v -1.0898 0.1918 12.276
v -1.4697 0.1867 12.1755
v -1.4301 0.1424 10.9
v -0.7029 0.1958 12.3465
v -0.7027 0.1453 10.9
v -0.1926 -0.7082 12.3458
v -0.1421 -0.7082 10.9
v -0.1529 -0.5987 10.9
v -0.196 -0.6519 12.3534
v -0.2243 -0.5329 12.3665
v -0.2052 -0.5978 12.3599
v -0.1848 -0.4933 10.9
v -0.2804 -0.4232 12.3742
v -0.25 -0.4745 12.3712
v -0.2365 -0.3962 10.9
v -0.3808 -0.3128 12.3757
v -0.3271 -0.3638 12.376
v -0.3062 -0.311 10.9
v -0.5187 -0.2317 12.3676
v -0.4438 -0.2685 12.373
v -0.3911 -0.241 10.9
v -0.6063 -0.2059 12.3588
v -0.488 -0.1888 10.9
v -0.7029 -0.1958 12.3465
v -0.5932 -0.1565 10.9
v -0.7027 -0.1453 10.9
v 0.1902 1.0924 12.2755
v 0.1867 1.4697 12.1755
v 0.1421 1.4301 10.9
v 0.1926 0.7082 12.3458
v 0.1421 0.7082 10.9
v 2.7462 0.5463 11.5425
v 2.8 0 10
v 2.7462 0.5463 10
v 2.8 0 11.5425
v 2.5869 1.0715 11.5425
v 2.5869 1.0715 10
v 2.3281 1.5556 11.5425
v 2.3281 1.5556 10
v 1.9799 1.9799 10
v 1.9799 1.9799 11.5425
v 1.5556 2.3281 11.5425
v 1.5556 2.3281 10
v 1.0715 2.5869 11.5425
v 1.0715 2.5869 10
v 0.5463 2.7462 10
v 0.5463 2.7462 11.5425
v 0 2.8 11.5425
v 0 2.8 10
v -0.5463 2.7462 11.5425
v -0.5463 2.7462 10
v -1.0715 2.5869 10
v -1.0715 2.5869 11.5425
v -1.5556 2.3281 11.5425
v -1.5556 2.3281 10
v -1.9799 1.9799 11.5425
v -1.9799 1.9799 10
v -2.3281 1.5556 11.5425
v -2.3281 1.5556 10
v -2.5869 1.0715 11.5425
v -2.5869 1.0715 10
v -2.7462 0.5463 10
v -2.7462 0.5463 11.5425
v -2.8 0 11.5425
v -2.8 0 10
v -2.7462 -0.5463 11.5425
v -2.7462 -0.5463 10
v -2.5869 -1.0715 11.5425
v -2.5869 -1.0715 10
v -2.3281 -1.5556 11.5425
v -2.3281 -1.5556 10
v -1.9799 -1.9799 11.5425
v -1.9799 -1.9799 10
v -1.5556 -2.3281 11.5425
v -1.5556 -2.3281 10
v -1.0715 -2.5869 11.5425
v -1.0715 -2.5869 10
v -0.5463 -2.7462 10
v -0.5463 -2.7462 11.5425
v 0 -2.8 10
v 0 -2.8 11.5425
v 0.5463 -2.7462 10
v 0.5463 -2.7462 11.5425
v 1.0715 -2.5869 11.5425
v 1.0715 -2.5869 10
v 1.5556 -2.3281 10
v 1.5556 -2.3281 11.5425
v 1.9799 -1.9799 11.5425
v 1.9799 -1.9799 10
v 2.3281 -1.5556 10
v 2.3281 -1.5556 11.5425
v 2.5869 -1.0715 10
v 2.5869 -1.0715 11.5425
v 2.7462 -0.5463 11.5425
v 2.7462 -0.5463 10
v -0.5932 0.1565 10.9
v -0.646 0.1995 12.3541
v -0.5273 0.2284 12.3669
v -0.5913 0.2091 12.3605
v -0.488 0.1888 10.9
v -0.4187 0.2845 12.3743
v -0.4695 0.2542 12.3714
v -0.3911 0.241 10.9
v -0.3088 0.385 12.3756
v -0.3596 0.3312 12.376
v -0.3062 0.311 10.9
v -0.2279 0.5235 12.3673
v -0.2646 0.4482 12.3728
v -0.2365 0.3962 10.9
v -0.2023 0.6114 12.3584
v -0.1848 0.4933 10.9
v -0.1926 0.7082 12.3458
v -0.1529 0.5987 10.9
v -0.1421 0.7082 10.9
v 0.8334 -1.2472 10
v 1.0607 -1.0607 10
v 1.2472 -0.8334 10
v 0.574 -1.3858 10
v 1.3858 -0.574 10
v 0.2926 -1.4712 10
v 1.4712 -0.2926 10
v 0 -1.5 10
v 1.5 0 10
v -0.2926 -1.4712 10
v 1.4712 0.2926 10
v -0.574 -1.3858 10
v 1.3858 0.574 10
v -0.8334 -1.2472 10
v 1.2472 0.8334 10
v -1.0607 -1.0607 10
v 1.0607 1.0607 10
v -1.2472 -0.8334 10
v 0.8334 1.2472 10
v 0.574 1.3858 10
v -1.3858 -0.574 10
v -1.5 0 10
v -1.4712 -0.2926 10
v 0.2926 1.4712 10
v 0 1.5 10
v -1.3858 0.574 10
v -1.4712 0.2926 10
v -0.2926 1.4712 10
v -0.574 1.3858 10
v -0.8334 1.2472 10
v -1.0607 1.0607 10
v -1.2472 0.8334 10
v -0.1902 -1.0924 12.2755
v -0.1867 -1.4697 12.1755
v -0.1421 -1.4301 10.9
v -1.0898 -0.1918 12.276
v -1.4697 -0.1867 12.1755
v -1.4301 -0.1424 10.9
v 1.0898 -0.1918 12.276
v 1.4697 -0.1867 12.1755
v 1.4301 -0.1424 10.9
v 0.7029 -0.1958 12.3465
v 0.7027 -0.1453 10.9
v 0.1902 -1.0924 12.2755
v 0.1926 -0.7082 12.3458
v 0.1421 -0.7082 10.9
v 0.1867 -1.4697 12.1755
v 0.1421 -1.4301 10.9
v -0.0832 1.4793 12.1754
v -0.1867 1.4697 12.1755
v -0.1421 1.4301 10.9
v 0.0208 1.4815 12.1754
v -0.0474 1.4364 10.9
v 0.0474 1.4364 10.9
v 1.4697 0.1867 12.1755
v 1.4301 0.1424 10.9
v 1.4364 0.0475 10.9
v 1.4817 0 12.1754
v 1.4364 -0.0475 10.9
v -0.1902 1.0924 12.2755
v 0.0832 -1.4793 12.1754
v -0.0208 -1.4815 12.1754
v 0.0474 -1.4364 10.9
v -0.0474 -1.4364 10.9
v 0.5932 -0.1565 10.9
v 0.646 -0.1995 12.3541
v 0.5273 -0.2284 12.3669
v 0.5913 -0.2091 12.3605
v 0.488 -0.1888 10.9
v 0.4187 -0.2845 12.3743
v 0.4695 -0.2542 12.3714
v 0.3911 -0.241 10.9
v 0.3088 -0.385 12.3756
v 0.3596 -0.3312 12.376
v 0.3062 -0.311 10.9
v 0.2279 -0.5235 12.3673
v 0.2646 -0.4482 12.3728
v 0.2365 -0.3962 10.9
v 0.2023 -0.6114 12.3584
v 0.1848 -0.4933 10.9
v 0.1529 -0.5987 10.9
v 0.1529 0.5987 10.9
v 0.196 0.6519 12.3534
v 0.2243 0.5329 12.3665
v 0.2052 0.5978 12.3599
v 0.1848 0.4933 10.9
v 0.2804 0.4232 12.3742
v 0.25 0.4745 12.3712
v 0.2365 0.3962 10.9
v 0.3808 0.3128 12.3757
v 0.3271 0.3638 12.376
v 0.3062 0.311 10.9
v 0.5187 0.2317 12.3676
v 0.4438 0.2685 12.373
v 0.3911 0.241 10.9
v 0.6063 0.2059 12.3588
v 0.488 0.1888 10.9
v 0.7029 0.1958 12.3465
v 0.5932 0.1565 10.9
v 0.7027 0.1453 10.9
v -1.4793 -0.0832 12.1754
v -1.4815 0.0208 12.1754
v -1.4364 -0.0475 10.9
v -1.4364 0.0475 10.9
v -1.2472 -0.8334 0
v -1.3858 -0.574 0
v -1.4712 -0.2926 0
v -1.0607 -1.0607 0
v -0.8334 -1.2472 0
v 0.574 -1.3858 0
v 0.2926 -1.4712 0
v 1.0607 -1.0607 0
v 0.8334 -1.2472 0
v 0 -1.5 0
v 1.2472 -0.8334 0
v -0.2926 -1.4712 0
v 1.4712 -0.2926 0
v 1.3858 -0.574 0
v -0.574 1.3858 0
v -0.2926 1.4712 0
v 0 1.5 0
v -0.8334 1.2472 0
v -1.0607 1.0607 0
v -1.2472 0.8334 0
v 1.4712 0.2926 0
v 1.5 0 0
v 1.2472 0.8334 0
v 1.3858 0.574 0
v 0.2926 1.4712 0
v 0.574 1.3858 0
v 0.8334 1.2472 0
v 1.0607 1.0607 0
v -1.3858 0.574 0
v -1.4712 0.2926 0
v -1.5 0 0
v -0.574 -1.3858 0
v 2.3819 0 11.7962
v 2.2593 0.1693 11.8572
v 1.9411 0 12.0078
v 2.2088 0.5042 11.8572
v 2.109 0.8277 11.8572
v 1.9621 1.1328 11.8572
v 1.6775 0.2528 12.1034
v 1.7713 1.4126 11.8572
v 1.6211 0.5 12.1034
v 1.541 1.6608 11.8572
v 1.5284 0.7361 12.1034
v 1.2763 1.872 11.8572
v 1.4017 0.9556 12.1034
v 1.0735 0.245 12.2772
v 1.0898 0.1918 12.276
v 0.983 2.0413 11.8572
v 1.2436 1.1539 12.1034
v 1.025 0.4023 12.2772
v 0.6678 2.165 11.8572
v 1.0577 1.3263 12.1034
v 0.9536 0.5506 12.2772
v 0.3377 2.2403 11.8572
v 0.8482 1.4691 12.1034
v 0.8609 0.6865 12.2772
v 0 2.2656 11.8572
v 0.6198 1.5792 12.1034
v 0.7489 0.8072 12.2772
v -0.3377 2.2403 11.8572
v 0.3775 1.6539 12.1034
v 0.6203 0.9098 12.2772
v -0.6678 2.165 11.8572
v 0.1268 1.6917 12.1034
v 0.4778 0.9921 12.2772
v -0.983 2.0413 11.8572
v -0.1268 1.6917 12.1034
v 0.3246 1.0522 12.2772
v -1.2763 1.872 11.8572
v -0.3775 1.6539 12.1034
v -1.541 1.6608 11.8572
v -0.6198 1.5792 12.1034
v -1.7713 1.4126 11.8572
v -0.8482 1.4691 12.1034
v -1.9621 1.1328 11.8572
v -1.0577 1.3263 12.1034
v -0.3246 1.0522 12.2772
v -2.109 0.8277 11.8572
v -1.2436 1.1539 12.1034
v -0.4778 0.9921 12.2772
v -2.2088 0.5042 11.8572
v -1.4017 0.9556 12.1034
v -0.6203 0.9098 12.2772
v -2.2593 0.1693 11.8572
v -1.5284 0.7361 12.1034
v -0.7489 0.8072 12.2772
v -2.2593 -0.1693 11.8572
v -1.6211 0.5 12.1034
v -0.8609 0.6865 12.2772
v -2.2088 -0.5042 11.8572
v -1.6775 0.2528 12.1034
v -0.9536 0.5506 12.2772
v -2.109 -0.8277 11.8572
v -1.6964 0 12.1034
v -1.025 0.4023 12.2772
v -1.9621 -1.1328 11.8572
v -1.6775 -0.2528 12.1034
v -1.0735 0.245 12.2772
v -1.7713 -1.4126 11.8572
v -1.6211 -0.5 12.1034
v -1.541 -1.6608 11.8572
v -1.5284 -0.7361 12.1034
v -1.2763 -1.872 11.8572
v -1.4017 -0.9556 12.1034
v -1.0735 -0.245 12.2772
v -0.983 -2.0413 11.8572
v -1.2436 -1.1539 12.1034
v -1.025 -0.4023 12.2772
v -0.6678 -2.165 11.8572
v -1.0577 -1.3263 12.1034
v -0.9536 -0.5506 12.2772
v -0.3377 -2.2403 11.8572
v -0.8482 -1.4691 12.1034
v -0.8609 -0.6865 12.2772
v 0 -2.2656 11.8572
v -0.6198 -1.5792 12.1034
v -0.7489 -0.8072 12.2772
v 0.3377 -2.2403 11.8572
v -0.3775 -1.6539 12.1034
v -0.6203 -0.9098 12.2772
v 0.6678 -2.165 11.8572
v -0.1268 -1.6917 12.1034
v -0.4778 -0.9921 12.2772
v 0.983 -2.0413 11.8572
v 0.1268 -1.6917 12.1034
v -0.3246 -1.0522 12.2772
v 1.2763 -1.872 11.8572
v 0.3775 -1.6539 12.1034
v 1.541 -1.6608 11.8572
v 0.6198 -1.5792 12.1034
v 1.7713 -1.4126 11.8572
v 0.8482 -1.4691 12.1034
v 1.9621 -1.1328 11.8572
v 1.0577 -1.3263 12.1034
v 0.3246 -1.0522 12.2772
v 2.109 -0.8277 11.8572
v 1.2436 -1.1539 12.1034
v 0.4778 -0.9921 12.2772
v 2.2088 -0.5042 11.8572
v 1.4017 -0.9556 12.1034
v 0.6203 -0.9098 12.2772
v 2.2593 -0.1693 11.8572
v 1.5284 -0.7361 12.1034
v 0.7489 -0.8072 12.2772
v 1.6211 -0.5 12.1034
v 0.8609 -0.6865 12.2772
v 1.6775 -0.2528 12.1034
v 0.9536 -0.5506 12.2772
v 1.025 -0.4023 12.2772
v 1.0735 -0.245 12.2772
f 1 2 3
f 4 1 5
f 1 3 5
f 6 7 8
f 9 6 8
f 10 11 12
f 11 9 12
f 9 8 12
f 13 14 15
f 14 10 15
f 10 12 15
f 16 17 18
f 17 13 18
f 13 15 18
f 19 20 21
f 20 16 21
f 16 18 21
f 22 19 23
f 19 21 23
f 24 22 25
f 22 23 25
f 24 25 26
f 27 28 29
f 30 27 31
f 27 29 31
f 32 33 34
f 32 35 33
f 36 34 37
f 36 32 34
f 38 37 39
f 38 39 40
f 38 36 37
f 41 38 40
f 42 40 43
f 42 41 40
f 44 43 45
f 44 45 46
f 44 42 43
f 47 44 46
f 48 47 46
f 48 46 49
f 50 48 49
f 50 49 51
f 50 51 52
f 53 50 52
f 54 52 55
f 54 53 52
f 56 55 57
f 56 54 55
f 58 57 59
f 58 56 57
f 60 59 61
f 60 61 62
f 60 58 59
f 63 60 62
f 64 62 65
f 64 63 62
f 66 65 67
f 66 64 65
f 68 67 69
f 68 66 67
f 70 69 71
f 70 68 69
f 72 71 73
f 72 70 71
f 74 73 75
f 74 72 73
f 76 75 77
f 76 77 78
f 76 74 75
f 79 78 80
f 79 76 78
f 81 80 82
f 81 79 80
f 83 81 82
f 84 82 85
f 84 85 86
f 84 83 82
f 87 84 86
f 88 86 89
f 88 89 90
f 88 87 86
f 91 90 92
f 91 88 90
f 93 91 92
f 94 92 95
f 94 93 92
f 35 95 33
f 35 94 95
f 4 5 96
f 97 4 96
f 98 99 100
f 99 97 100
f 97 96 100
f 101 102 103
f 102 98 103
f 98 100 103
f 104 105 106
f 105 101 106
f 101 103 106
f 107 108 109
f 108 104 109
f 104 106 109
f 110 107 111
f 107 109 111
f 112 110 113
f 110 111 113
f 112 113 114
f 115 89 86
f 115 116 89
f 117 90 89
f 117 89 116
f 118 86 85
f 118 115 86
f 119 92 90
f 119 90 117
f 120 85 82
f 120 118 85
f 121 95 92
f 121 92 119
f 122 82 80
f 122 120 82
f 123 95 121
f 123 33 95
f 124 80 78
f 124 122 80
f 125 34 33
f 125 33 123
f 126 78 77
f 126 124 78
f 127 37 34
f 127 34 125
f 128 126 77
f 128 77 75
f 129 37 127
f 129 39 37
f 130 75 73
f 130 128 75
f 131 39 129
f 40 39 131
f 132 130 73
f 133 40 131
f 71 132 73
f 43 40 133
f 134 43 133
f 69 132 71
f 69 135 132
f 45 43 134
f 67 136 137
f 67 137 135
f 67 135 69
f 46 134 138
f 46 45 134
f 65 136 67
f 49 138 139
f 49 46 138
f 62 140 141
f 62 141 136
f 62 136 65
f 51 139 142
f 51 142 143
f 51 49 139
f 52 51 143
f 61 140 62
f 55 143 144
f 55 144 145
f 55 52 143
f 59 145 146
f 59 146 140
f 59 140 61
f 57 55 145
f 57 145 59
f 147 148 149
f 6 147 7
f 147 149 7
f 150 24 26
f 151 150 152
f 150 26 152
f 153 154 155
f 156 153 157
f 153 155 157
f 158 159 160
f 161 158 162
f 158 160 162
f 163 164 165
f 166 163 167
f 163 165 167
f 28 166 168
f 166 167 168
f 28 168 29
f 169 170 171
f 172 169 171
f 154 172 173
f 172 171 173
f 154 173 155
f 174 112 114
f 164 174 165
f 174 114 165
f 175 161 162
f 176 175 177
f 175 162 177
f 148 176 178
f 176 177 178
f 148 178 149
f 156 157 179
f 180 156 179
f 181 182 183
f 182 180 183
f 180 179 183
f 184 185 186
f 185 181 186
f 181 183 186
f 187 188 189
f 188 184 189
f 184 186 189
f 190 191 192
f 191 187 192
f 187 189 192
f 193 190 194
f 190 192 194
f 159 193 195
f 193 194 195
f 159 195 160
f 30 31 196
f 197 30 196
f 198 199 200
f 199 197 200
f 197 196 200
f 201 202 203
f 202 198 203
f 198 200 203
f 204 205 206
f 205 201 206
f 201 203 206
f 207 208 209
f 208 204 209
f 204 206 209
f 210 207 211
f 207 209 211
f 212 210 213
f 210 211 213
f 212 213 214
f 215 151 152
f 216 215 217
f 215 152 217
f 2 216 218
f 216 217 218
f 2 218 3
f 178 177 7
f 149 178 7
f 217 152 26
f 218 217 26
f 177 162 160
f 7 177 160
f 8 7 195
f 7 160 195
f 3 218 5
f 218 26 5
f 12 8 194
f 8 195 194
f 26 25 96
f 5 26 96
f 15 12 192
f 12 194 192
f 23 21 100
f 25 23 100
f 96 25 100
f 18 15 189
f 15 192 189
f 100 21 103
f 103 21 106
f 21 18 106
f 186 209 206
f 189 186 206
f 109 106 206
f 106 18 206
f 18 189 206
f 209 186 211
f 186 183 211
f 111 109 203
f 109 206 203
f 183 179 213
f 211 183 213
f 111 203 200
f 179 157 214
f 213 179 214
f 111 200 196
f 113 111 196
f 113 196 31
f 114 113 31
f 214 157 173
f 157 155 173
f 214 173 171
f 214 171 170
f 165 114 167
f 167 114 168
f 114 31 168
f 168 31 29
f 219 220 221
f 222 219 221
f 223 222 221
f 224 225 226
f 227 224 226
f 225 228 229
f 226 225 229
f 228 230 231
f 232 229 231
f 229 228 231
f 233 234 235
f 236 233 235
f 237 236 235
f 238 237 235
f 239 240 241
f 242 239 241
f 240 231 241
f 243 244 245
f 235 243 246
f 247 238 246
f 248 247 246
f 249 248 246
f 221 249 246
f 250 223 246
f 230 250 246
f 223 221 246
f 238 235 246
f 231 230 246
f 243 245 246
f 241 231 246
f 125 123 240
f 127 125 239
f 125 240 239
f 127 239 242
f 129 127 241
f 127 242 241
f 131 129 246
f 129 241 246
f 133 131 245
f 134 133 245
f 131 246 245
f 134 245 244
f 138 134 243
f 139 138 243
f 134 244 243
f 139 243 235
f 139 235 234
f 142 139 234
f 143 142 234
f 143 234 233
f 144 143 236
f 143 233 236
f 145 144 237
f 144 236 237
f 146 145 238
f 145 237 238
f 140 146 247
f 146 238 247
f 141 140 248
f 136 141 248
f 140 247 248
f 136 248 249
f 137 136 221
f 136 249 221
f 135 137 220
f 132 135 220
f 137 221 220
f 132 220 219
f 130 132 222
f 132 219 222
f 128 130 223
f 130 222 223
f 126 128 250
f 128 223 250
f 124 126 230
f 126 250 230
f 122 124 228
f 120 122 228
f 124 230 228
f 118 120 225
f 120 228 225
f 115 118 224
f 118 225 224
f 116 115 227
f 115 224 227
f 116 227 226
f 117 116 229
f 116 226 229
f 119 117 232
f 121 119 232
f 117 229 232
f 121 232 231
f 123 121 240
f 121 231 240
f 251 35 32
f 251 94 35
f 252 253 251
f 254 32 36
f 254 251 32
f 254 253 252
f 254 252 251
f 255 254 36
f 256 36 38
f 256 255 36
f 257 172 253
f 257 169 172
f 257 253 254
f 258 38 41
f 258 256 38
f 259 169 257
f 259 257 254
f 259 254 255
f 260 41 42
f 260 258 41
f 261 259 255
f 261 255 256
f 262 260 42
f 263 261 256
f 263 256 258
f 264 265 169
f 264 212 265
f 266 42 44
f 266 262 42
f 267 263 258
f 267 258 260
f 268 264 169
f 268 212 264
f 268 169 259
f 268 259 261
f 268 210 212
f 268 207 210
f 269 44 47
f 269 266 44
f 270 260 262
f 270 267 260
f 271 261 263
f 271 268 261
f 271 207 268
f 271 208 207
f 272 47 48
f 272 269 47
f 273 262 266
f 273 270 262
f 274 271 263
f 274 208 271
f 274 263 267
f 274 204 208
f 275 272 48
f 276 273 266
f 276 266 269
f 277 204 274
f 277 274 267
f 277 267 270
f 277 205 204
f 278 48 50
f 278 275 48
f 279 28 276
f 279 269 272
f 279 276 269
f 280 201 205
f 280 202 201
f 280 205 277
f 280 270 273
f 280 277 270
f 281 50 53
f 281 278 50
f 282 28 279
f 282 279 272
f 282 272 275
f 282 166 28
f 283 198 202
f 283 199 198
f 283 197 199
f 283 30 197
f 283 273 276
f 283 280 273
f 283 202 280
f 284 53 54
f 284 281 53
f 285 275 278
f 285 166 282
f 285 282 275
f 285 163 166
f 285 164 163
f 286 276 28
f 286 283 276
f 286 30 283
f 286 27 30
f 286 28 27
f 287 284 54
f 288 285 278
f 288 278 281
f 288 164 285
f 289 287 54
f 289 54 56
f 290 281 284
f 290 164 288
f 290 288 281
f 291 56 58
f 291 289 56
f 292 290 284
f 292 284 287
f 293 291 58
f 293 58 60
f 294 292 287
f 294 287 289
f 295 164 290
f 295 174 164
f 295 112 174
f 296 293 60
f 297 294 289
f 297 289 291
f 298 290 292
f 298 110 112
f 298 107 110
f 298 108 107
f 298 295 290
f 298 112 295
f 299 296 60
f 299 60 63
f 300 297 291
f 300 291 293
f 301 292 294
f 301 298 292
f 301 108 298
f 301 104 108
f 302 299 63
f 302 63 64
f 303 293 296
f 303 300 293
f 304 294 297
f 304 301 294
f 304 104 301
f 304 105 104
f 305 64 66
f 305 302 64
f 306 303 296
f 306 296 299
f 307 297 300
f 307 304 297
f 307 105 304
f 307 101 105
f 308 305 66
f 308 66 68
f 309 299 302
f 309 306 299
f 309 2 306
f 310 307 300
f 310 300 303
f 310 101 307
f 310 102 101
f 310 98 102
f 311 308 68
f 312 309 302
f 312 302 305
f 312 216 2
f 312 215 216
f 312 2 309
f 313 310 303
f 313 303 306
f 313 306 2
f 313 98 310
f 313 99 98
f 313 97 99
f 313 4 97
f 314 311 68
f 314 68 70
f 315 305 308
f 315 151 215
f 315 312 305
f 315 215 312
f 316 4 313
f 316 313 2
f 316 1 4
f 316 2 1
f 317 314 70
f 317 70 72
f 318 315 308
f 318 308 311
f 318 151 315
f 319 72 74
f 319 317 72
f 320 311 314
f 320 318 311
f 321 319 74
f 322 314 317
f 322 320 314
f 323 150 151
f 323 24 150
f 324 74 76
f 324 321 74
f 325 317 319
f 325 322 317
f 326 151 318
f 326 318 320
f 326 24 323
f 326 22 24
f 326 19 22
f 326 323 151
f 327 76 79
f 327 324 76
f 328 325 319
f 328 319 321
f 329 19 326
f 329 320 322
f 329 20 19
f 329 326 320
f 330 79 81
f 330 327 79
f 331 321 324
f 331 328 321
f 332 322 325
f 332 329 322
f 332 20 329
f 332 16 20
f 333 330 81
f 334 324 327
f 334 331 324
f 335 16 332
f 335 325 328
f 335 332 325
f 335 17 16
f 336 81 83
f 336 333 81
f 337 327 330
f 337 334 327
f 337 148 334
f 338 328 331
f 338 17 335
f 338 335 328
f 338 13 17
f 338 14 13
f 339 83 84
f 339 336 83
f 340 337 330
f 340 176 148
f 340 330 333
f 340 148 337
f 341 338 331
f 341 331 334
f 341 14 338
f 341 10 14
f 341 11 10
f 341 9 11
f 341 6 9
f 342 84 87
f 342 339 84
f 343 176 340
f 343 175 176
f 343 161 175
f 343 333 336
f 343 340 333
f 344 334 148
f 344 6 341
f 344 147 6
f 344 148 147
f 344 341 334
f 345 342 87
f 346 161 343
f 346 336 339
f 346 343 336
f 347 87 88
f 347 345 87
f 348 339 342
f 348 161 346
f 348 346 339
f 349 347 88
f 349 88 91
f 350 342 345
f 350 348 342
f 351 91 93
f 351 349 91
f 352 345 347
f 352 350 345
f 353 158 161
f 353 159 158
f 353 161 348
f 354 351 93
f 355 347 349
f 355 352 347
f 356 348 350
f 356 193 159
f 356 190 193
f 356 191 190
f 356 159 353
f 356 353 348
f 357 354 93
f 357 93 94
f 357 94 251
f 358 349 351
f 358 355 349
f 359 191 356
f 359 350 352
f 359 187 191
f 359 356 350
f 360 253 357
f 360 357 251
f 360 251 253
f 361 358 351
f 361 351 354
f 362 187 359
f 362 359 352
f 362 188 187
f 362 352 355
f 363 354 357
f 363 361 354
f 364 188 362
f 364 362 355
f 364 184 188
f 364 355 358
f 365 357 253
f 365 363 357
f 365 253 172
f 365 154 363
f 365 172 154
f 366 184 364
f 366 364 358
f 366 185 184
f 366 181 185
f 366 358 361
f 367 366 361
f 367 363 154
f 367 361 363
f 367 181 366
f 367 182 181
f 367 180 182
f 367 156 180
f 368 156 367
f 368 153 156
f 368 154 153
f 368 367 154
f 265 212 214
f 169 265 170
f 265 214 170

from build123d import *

# Parameters (mm, degrees)
SKETCH1_R          = 1.5
BASE_EXTRUDE_DEPTH = 10
CUT_EXTRUDE1_DEPTH = 1.799999969
CUT_EXTRUDE1_TAPER = 2


with BuildPart() as part:
    # Sketch1 → Base-Extrude (new body)
    with BuildSketch(Plane.XY):
        Circle(SKETCH1_R)
    extrude(amount=BASE_EXTRUDE_DEPTH)

    # Sketch6 → Boss-Revolve2 (revolve)
    with BuildSketch(Plane(origin=(0, 0, 0), x_dir=(1, 0, 0), z_dir=(0, 1, 0))):
        with BuildLine():
            Line((0, -10), (2.7999999, -10))
            Line((2.7999999, -10), (2.7999999, -11.54246308))
            ThreePointArc((2.7999999, -11.54246308), (1.46418655, -12.180811406), (0, -12.4))
            Line((0, -12.4), (0, -10))
        make_face()
    revolve(axis=Axis((0, 0, -0.393620135), (0, 0, 1)))

    # Sketch7 → Cut-Extrude1 (cut)
    with BuildSketch(Plane(origin=(0, 0, 12.7000001), x_dir=(-1, 0, 0), z_dir=(0, 0, -1))):
        with BuildLine():
            ThreePointArc((0.205000004, 1.48592565), (0, 1.500000013), (-0.205000004, 1.48592565))
            Line((-0.205000004, 1.48592565), (-0.205000004, 0.708178558))
            ThreePointArc((-0.205000004, 0.708178558), (-0.35072876, 0.355344481), (-0.702967546, 0.208182689))
            Line((-0.702967546, 0.208182689), (-1.48592565, 0.205000004))
            ThreePointArc((-1.48592565, 0.205000004), (-1.500000013, 0), (-1.48592565, -0.205000004))
            Line((-1.48592565, -0.205000004), (-0.702967546, -0.208182689))
            ThreePointArc((-0.702967546, -0.208182689), (-0.35072876, -0.355344481), (-0.205000004, -0.708178558))
            Line((-0.205000004, -0.708178558), (-0.205000004, -1.48592565))
            ThreePointArc((-0.205000004, -1.48592565), (0, -1.500000013), (0.205000004, -1.48592565))
            Line((0.205000004, -1.48592565), (0.205000004, -0.708178558))
            ThreePointArc((0.205000004, -0.708178558), (0.35072876, -0.355344481), (0.702967546, -0.208182689))
            Line((0.702967546, -0.208182689), (1.48592565, -0.205000004))
            ThreePointArc((1.48592565, -0.205000004), (1.500000013, 0), (1.48592565, 0.205000004))
            Line((1.48592565, 0.205000004), (0.702967546, 0.208182689))
            ThreePointArc((0.702967546, 0.208182689), (0.35072876, 0.355344481), (0.205000004, 0.708178558))
            Line((0.205000004, 0.708178558), (0.205000004, 1.48592565))
        make_face()
    extrude(amount=CUT_EXTRUDE1_DEPTH, taper=CUT_EXTRUDE1_TAPER, mode=Mode.SUBTRACT)


solid = part.part
